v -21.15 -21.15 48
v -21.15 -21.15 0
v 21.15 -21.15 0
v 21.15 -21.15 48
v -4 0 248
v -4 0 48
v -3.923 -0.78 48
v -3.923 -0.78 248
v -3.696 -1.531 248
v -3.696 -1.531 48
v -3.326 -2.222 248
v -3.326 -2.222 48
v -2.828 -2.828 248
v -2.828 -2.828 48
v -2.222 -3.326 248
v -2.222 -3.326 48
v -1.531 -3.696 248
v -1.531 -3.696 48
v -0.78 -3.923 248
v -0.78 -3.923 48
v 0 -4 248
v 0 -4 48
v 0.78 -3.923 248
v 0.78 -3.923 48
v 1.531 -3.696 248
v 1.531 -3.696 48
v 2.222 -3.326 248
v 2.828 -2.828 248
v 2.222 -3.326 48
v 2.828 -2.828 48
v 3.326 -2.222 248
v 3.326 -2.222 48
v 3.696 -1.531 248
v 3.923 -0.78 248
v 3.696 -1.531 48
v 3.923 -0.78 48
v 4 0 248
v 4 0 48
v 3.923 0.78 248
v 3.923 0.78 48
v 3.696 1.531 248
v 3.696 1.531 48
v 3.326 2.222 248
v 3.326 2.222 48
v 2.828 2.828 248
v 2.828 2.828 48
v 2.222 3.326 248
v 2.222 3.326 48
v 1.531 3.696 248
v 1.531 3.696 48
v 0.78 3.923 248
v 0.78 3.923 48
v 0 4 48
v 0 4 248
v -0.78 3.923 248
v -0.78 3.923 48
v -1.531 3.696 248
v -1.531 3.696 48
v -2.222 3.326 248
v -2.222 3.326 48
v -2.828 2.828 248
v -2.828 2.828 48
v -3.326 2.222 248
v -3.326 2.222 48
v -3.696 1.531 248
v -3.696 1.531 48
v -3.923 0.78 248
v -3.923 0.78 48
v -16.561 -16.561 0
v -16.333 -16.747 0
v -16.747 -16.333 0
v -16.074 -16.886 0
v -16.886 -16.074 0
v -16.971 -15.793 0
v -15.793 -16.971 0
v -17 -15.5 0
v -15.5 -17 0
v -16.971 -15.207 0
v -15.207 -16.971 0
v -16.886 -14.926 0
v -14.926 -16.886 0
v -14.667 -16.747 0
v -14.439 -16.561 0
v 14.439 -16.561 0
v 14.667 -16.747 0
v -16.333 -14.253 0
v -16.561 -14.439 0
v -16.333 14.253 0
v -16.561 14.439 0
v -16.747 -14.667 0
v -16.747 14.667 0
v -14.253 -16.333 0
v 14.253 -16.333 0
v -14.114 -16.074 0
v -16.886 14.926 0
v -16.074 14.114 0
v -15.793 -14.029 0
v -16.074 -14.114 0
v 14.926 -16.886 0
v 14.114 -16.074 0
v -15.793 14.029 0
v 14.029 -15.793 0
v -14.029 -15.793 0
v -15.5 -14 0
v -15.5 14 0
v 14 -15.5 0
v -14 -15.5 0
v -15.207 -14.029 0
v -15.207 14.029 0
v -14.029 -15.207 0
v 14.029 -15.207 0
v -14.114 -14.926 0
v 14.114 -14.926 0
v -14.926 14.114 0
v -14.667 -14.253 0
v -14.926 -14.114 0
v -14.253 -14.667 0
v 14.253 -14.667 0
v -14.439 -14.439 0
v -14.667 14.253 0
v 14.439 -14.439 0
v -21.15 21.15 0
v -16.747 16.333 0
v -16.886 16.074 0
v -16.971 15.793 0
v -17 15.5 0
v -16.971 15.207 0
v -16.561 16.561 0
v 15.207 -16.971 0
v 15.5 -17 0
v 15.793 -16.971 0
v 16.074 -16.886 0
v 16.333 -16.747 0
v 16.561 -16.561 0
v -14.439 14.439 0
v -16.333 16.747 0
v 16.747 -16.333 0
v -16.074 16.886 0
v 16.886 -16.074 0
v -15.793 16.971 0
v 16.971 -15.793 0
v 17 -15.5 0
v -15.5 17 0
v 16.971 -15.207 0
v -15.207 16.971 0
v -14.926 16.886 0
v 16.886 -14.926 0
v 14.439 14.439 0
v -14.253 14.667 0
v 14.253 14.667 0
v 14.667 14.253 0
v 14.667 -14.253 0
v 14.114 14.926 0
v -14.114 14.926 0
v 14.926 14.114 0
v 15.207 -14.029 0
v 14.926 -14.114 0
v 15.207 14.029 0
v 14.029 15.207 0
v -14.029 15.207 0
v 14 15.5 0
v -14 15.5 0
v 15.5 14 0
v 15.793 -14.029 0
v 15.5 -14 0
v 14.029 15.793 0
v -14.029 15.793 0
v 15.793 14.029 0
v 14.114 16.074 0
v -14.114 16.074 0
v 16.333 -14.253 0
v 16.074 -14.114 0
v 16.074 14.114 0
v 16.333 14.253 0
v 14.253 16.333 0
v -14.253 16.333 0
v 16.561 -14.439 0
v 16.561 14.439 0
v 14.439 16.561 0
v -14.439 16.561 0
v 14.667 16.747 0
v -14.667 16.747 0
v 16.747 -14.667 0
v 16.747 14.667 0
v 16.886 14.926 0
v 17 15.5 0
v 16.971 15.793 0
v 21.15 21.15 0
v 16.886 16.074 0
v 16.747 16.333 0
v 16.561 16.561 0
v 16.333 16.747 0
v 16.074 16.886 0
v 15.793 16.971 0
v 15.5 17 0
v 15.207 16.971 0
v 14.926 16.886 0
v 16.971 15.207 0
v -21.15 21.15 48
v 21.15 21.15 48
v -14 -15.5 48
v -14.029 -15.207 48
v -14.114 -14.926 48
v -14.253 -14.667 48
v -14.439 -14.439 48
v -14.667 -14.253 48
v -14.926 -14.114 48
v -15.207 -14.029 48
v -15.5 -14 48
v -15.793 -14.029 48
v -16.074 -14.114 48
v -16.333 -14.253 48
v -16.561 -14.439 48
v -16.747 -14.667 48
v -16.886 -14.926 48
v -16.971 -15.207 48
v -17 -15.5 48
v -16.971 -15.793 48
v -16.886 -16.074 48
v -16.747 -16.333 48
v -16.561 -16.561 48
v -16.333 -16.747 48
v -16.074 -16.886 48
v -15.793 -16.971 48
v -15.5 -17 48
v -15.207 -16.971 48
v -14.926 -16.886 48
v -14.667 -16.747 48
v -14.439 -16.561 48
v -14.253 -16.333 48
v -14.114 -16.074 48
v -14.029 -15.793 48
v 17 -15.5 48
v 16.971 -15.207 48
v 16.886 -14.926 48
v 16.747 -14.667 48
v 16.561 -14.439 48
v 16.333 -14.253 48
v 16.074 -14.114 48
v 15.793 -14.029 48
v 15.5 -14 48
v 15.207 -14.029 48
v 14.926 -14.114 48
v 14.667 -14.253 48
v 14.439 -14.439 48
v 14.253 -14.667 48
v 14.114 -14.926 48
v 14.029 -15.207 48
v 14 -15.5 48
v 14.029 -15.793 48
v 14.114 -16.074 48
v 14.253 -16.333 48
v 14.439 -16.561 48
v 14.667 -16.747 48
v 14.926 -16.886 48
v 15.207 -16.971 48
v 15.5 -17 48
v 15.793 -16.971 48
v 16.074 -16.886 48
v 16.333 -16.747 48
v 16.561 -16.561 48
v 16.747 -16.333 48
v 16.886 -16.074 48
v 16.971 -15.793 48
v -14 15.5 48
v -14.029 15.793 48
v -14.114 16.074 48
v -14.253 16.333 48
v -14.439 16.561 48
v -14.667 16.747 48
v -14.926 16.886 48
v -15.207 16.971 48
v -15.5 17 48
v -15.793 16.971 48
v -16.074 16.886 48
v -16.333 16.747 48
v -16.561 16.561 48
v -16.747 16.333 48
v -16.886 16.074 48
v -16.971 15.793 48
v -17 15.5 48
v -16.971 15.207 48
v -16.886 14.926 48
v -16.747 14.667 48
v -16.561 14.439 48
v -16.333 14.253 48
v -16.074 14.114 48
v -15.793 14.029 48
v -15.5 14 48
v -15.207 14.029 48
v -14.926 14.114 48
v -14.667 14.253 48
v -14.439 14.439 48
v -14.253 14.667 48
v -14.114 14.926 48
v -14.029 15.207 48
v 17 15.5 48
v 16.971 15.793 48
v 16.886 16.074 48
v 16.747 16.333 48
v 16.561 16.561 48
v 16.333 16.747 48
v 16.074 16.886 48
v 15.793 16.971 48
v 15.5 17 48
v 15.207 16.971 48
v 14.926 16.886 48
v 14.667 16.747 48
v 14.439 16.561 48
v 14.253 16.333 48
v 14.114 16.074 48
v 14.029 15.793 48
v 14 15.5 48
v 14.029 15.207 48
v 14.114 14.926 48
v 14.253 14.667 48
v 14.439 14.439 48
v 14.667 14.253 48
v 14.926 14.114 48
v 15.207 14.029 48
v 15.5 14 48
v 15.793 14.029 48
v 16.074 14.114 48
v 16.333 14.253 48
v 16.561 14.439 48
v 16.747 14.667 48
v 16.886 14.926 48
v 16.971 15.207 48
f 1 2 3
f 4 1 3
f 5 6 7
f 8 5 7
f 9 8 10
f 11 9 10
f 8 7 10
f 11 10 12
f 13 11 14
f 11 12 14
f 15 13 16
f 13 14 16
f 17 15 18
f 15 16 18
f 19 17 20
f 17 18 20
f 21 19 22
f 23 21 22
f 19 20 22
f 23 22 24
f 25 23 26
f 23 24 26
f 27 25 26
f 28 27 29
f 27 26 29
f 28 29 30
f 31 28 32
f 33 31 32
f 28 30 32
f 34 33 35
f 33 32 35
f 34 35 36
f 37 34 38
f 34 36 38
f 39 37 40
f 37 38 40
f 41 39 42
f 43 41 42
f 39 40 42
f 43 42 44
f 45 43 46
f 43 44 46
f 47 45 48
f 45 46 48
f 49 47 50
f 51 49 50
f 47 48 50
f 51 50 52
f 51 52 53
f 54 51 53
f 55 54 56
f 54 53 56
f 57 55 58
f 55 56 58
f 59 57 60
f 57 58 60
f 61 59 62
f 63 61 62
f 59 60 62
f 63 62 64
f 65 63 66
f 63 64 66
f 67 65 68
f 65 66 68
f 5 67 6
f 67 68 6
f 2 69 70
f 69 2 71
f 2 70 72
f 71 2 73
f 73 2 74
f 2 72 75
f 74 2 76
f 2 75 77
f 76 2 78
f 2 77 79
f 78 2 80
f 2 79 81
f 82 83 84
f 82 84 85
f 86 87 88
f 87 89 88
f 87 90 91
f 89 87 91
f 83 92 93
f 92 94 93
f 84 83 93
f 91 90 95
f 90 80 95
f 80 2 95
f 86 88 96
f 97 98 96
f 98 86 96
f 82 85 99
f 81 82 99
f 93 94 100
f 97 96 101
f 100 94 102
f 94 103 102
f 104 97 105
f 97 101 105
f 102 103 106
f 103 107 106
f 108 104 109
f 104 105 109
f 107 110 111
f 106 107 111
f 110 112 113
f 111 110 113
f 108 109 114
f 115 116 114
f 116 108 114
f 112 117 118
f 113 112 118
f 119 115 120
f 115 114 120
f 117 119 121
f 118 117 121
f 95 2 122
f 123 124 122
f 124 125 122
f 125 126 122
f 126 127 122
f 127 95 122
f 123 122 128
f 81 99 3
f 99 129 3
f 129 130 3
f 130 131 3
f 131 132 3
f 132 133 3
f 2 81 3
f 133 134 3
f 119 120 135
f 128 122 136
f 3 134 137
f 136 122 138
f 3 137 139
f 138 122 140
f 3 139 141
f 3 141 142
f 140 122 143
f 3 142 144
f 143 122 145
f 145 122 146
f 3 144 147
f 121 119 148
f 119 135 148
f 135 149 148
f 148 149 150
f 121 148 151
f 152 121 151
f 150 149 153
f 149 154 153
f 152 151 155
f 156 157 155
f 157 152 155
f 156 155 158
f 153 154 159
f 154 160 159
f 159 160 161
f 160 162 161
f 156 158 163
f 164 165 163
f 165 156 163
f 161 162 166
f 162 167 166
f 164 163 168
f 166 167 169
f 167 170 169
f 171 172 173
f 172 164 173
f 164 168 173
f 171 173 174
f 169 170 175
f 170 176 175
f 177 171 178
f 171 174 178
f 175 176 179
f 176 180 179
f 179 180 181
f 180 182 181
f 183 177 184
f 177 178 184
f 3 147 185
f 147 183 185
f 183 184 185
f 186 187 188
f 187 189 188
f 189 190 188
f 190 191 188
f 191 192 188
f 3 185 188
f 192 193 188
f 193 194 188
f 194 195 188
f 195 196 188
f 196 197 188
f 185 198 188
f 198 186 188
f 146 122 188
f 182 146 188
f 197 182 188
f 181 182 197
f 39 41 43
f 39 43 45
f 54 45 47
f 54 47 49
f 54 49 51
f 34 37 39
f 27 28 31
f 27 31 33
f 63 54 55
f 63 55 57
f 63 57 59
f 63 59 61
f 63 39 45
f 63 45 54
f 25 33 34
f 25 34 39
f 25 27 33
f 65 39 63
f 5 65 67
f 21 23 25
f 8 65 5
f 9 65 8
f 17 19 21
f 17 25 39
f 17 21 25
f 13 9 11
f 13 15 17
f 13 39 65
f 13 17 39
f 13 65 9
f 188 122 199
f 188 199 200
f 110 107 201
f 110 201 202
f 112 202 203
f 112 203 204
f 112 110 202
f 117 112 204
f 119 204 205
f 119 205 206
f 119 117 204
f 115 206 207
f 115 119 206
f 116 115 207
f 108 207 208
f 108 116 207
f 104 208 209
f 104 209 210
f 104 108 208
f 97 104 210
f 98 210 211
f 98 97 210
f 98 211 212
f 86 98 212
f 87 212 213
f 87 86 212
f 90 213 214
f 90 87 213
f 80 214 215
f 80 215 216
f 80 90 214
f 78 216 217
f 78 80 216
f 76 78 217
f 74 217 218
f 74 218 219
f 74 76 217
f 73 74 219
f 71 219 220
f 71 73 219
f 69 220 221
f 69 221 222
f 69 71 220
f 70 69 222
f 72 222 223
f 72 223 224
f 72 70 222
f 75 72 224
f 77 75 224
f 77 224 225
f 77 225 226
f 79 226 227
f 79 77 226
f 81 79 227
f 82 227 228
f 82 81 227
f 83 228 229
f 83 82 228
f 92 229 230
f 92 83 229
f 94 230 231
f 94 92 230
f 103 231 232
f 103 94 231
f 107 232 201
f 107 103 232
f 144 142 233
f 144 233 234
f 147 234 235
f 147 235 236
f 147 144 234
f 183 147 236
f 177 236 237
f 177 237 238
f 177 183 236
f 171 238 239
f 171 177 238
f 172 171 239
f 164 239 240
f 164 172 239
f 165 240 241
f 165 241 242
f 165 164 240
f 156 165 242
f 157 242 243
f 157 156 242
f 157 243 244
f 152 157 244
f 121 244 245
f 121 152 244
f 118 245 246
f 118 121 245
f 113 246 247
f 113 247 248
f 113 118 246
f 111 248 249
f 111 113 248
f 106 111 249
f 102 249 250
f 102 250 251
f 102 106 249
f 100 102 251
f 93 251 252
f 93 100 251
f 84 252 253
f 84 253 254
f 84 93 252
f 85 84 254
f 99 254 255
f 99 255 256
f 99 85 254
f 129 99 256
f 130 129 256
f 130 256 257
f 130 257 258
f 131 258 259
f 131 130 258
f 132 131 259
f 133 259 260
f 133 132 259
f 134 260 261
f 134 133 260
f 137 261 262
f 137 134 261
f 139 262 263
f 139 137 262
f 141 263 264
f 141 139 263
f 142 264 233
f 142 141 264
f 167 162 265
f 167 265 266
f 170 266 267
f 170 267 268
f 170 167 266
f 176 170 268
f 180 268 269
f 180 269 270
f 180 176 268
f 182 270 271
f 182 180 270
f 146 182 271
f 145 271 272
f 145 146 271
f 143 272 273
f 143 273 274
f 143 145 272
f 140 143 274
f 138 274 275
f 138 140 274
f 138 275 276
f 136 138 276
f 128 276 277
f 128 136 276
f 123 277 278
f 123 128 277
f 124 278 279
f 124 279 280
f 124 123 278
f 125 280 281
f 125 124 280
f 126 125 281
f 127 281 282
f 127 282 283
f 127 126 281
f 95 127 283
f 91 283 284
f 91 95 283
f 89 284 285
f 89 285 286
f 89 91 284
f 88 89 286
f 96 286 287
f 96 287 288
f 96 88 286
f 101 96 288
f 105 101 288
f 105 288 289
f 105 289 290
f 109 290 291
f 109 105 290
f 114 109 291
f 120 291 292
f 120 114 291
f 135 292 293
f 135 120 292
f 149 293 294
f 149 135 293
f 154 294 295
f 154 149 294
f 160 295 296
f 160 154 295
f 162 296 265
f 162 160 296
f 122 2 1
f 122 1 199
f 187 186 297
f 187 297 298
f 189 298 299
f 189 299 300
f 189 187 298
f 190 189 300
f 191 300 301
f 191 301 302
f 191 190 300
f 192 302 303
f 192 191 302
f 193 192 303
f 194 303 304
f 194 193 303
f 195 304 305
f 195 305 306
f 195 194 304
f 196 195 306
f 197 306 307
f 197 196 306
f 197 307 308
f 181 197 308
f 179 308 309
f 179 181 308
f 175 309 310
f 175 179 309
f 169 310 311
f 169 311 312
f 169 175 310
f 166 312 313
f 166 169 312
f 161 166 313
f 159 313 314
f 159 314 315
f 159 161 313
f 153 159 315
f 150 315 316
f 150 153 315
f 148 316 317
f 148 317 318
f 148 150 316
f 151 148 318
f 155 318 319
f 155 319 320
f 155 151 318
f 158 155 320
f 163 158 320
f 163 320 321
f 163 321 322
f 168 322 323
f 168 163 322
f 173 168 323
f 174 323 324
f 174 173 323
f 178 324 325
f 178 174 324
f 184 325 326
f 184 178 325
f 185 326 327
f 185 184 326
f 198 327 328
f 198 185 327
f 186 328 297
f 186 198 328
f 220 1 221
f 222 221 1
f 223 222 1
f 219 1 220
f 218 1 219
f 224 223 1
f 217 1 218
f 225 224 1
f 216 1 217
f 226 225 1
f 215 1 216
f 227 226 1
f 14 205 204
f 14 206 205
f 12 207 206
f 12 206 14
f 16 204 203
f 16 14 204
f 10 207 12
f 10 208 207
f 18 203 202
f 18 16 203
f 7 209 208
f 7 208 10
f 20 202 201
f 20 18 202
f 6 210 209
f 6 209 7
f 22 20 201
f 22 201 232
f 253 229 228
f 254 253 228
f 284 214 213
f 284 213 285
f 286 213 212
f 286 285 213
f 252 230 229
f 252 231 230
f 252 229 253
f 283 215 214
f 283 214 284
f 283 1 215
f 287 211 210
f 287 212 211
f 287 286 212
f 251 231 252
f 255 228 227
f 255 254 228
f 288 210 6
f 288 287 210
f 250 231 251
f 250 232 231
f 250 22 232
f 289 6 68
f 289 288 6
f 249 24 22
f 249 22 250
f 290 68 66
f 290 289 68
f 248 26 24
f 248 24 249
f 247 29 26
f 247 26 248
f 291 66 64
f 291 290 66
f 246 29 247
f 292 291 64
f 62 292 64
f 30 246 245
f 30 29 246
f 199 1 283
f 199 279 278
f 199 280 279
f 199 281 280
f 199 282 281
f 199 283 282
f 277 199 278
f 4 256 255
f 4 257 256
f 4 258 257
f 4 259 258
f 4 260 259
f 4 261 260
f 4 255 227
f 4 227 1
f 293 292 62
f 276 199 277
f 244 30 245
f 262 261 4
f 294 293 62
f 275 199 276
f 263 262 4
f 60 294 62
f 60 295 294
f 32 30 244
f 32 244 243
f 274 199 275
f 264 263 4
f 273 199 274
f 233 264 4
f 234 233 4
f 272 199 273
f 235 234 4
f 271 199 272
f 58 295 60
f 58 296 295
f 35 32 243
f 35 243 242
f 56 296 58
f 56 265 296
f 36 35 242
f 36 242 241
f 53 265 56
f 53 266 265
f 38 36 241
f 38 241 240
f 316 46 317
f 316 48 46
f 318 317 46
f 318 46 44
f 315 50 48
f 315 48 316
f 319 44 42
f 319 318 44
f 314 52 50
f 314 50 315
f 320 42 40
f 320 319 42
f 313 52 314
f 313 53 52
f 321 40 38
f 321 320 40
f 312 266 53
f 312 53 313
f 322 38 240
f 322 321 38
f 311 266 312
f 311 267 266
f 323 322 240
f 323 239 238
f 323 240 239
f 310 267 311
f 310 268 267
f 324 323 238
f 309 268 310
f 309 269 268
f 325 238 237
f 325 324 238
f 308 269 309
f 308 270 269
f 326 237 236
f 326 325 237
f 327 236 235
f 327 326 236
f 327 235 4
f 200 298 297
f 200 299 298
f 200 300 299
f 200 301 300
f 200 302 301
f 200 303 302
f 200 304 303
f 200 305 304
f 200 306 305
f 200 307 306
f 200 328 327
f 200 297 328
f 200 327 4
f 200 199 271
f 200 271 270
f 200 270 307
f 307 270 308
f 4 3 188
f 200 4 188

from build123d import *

# Parameters (mm, degrees)
SKETCH1_W           = 42.3
SKETCH1_H           = 42.3
SKETCH1_R           = 1.5
BOSS_EXTRUDE1_DEPTH = 48
SKETCH2_R           = 4
BOSS_EXTRUDE2_DEPTH = 200


with BuildPart() as part:
    # Sketch1 → Boss-Extrude1 (new body)
    with BuildSketch(Plane.XY):
        Rectangle(SKETCH1_W, SKETCH1_H)
        with Locations((15.5, 15.5)):
            Circle(SKETCH1_R, mode=Mode.SUBTRACT)
        with Locations((-15.5, 15.5)):
            Circle(SKETCH1_R, mode=Mode.SUBTRACT)
        with Locations((-15.5, -15.5)):
            Circle(SKETCH1_R, mode=Mode.SUBTRACT)
        with Locations((15.5, -15.5)):
            Circle(SKETCH1_R, mode=Mode.SUBTRACT)
    extrude(amount=BOSS_EXTRUDE1_DEPTH)

    # Sketch2 → Boss-Extrude2 (add)
    with BuildSketch(Plane.XY.offset(48)):
        with Locations(Location((0, 0, 0), (0, 0, 180))):
            Circle(SKETCH2_R)
    extrude(amount=BOSS_EXTRUDE2_DEPTH)


solid = part.part
